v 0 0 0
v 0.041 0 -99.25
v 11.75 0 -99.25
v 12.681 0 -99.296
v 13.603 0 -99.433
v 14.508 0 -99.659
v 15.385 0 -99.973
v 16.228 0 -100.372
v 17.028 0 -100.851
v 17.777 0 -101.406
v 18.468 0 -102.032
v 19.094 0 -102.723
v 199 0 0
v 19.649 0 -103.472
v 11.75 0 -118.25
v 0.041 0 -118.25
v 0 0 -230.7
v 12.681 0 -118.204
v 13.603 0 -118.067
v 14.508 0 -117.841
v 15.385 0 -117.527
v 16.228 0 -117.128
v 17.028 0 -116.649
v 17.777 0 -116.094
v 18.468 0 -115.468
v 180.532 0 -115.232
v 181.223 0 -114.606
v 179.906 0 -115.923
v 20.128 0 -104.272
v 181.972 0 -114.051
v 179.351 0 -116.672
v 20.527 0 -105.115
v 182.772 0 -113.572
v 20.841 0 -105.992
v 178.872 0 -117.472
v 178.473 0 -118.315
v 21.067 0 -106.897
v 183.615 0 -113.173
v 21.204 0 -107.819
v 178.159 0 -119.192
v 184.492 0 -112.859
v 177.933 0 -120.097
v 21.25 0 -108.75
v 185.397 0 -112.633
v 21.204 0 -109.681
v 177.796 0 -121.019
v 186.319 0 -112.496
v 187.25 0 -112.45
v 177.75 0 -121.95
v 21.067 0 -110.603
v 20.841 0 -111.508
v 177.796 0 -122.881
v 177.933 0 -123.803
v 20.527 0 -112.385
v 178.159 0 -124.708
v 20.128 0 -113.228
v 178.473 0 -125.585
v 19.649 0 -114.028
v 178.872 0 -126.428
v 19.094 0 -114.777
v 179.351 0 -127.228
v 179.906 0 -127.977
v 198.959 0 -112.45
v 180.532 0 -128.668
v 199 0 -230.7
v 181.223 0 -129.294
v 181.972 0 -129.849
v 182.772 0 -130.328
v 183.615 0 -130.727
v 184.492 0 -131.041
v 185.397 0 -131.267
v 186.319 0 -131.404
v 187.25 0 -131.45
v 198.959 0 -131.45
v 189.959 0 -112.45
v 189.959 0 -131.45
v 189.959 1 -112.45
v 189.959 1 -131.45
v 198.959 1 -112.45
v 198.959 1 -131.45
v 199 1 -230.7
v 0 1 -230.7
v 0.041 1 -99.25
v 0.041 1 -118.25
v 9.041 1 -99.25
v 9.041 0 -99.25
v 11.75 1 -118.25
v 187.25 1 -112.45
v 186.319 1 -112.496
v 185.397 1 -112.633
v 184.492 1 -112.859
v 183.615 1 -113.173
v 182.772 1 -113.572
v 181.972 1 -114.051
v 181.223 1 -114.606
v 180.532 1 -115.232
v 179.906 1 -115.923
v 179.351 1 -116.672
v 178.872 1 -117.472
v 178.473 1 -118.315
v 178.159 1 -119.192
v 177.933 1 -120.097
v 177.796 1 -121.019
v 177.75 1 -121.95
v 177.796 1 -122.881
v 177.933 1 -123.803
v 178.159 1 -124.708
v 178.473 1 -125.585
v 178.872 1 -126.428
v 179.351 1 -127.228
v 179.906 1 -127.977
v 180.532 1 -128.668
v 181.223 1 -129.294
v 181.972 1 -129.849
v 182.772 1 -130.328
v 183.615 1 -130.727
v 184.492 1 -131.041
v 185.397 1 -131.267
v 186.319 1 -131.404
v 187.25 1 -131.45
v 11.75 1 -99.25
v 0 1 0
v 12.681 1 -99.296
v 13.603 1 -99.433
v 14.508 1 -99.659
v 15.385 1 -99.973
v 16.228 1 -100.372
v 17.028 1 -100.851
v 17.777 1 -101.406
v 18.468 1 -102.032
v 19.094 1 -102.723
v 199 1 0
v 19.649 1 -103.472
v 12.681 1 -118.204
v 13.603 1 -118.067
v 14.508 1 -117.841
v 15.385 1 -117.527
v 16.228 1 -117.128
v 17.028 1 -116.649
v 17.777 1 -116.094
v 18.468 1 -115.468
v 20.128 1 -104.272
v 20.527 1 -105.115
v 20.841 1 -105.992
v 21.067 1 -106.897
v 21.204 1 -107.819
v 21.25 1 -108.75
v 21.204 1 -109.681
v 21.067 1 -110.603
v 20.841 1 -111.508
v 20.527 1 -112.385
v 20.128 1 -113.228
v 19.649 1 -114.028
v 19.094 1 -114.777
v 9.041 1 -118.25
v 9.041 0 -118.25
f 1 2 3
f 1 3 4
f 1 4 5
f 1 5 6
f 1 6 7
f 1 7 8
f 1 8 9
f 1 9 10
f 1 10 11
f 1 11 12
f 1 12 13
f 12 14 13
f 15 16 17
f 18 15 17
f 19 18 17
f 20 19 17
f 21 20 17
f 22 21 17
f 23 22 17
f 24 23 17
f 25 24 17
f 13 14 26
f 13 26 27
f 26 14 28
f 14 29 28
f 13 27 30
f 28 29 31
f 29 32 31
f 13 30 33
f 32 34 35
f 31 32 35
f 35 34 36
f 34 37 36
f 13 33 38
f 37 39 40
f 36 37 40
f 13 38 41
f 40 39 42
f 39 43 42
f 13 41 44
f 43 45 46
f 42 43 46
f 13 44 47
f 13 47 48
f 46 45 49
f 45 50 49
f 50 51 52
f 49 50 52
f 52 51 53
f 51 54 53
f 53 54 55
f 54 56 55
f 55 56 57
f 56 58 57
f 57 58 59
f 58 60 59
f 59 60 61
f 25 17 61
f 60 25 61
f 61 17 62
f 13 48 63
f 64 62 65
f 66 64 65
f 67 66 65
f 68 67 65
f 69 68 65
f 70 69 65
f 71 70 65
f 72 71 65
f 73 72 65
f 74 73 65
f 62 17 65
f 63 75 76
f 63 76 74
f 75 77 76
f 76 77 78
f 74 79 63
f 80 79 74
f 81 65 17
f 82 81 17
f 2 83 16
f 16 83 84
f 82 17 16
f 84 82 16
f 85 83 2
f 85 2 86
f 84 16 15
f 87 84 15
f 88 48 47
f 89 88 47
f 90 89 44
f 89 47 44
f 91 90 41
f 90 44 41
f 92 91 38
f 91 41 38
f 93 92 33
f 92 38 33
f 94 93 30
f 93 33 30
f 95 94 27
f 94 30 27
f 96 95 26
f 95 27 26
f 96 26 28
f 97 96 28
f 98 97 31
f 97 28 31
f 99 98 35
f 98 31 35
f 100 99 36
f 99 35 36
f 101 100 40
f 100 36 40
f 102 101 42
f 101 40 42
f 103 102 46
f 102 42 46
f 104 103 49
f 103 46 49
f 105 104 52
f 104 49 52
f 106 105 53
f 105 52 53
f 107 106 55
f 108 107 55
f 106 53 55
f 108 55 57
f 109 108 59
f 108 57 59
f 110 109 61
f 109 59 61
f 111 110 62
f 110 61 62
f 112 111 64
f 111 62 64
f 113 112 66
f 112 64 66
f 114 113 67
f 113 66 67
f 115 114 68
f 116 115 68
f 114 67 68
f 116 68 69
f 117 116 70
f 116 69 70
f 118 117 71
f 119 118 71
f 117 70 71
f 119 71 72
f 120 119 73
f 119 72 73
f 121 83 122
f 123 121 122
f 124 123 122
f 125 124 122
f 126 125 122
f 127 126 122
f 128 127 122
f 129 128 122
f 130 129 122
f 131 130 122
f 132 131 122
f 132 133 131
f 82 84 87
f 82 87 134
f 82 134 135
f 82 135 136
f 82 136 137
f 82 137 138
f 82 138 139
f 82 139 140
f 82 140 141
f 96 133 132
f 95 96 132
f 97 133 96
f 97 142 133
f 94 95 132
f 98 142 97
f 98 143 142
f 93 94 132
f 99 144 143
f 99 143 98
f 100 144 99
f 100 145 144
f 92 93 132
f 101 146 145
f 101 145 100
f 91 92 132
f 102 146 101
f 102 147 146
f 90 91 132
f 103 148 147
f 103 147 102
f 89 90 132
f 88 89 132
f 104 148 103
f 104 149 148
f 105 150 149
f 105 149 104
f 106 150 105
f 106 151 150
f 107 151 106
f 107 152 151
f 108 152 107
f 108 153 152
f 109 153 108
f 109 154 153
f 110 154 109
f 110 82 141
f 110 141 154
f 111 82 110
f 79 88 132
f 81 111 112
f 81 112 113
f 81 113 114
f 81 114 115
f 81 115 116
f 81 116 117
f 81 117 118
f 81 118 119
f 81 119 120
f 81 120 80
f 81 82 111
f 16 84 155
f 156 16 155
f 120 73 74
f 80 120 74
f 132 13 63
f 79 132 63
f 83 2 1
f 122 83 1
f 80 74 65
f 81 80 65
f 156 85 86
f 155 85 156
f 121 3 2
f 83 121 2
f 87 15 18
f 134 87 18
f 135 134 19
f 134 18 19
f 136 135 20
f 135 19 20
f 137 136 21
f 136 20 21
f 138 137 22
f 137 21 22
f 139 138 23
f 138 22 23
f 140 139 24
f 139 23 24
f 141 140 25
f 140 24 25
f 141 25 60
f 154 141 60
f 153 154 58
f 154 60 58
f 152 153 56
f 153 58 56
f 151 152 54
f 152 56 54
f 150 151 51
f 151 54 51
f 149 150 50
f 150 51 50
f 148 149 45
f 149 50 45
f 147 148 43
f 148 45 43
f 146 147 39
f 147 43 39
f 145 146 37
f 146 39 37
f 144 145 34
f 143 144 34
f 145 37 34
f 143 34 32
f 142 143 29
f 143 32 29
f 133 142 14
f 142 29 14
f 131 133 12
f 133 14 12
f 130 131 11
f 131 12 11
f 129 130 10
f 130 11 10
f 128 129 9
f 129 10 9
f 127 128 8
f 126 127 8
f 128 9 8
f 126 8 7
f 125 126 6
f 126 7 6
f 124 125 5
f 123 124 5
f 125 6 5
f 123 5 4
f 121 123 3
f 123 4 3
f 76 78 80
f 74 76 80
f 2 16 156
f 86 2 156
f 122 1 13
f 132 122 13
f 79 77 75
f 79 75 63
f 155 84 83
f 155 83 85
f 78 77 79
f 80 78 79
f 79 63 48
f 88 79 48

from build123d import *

# Parameters (mm, degrees)
BOSS_EXTRUDE1_DEPTH   = 1
SKETCH2_W             = 9
SKETCH2_H             = 19
BOSS_EXTRUDE2_DEPTH   = 1
BOSS_EXTRUDE2_2_DEPTH = 1


with BuildPart() as part:
    # Sketch1 → Boss-Extrude1 (new body)
    with BuildSketch(Plane(origin=(0, 0, 0), x_dir=(1, 0, 0), z_dir=(0, 1, 0))):
        with BuildLine():
            Line((0, 0), (199, 0))
            Line((199, 0), (198.959369161, 112.45))
            Line((198.959369161, 112.45), (187.25, 112.45))
            ThreePointArc((187.25, 112.45), (177.75, 121.95), (187.25, 131.45))
            Line((187.25, 131.45), (198.959369161, 131.45))
            Line((198.959369161, 131.45), (199, 230.7))
            Line((199, 230.7), (0, 230.7))
            Line((0, 230.7), (0.040630839, 118.25))
            Line((0.040630839, 118.25), (11.75, 118.25))
            ThreePointArc((11.75, 118.25), (21.25, 108.75), (11.75, 99.25))
            Line((11.75, 99.25), (0.040630839, 99.25))
            Line((0.040630839, 99.25), (0, 0))
        make_face()
    extrude(amount=BOSS_EXTRUDE1_DEPTH)


with BuildPart() as body_2:
    # Sketch2 → Boss-Extrude2 (new, through all)
    with BuildSketch(Plane(origin=(0, 1, 0), x_dir=(1, 0, 0), z_dir=(0, 1, 0))):
        with Locations((4.540630839, 108.75)):
            Rectangle(SKETCH2_W, SKETCH2_H)
    extrude(amount=-BOSS_EXTRUDE2_DEPTH)


with BuildPart() as body_3:
    # Sketch2 → Boss-Extrude2 2 (new, through all)
    with BuildSketch(Plane(origin=(0, 1, 0), x_dir=(1, 0, 0), z_dir=(0, 1, 0))):
        with Locations((194.459369161, 121.95)):
            Rectangle(SKETCH2_W, SKETCH2_H)
    extrude(amount=-BOSS_EXTRUDE2_2_DEPTH)


solid = Compound([part.part, body_2.part, body_3.part])
